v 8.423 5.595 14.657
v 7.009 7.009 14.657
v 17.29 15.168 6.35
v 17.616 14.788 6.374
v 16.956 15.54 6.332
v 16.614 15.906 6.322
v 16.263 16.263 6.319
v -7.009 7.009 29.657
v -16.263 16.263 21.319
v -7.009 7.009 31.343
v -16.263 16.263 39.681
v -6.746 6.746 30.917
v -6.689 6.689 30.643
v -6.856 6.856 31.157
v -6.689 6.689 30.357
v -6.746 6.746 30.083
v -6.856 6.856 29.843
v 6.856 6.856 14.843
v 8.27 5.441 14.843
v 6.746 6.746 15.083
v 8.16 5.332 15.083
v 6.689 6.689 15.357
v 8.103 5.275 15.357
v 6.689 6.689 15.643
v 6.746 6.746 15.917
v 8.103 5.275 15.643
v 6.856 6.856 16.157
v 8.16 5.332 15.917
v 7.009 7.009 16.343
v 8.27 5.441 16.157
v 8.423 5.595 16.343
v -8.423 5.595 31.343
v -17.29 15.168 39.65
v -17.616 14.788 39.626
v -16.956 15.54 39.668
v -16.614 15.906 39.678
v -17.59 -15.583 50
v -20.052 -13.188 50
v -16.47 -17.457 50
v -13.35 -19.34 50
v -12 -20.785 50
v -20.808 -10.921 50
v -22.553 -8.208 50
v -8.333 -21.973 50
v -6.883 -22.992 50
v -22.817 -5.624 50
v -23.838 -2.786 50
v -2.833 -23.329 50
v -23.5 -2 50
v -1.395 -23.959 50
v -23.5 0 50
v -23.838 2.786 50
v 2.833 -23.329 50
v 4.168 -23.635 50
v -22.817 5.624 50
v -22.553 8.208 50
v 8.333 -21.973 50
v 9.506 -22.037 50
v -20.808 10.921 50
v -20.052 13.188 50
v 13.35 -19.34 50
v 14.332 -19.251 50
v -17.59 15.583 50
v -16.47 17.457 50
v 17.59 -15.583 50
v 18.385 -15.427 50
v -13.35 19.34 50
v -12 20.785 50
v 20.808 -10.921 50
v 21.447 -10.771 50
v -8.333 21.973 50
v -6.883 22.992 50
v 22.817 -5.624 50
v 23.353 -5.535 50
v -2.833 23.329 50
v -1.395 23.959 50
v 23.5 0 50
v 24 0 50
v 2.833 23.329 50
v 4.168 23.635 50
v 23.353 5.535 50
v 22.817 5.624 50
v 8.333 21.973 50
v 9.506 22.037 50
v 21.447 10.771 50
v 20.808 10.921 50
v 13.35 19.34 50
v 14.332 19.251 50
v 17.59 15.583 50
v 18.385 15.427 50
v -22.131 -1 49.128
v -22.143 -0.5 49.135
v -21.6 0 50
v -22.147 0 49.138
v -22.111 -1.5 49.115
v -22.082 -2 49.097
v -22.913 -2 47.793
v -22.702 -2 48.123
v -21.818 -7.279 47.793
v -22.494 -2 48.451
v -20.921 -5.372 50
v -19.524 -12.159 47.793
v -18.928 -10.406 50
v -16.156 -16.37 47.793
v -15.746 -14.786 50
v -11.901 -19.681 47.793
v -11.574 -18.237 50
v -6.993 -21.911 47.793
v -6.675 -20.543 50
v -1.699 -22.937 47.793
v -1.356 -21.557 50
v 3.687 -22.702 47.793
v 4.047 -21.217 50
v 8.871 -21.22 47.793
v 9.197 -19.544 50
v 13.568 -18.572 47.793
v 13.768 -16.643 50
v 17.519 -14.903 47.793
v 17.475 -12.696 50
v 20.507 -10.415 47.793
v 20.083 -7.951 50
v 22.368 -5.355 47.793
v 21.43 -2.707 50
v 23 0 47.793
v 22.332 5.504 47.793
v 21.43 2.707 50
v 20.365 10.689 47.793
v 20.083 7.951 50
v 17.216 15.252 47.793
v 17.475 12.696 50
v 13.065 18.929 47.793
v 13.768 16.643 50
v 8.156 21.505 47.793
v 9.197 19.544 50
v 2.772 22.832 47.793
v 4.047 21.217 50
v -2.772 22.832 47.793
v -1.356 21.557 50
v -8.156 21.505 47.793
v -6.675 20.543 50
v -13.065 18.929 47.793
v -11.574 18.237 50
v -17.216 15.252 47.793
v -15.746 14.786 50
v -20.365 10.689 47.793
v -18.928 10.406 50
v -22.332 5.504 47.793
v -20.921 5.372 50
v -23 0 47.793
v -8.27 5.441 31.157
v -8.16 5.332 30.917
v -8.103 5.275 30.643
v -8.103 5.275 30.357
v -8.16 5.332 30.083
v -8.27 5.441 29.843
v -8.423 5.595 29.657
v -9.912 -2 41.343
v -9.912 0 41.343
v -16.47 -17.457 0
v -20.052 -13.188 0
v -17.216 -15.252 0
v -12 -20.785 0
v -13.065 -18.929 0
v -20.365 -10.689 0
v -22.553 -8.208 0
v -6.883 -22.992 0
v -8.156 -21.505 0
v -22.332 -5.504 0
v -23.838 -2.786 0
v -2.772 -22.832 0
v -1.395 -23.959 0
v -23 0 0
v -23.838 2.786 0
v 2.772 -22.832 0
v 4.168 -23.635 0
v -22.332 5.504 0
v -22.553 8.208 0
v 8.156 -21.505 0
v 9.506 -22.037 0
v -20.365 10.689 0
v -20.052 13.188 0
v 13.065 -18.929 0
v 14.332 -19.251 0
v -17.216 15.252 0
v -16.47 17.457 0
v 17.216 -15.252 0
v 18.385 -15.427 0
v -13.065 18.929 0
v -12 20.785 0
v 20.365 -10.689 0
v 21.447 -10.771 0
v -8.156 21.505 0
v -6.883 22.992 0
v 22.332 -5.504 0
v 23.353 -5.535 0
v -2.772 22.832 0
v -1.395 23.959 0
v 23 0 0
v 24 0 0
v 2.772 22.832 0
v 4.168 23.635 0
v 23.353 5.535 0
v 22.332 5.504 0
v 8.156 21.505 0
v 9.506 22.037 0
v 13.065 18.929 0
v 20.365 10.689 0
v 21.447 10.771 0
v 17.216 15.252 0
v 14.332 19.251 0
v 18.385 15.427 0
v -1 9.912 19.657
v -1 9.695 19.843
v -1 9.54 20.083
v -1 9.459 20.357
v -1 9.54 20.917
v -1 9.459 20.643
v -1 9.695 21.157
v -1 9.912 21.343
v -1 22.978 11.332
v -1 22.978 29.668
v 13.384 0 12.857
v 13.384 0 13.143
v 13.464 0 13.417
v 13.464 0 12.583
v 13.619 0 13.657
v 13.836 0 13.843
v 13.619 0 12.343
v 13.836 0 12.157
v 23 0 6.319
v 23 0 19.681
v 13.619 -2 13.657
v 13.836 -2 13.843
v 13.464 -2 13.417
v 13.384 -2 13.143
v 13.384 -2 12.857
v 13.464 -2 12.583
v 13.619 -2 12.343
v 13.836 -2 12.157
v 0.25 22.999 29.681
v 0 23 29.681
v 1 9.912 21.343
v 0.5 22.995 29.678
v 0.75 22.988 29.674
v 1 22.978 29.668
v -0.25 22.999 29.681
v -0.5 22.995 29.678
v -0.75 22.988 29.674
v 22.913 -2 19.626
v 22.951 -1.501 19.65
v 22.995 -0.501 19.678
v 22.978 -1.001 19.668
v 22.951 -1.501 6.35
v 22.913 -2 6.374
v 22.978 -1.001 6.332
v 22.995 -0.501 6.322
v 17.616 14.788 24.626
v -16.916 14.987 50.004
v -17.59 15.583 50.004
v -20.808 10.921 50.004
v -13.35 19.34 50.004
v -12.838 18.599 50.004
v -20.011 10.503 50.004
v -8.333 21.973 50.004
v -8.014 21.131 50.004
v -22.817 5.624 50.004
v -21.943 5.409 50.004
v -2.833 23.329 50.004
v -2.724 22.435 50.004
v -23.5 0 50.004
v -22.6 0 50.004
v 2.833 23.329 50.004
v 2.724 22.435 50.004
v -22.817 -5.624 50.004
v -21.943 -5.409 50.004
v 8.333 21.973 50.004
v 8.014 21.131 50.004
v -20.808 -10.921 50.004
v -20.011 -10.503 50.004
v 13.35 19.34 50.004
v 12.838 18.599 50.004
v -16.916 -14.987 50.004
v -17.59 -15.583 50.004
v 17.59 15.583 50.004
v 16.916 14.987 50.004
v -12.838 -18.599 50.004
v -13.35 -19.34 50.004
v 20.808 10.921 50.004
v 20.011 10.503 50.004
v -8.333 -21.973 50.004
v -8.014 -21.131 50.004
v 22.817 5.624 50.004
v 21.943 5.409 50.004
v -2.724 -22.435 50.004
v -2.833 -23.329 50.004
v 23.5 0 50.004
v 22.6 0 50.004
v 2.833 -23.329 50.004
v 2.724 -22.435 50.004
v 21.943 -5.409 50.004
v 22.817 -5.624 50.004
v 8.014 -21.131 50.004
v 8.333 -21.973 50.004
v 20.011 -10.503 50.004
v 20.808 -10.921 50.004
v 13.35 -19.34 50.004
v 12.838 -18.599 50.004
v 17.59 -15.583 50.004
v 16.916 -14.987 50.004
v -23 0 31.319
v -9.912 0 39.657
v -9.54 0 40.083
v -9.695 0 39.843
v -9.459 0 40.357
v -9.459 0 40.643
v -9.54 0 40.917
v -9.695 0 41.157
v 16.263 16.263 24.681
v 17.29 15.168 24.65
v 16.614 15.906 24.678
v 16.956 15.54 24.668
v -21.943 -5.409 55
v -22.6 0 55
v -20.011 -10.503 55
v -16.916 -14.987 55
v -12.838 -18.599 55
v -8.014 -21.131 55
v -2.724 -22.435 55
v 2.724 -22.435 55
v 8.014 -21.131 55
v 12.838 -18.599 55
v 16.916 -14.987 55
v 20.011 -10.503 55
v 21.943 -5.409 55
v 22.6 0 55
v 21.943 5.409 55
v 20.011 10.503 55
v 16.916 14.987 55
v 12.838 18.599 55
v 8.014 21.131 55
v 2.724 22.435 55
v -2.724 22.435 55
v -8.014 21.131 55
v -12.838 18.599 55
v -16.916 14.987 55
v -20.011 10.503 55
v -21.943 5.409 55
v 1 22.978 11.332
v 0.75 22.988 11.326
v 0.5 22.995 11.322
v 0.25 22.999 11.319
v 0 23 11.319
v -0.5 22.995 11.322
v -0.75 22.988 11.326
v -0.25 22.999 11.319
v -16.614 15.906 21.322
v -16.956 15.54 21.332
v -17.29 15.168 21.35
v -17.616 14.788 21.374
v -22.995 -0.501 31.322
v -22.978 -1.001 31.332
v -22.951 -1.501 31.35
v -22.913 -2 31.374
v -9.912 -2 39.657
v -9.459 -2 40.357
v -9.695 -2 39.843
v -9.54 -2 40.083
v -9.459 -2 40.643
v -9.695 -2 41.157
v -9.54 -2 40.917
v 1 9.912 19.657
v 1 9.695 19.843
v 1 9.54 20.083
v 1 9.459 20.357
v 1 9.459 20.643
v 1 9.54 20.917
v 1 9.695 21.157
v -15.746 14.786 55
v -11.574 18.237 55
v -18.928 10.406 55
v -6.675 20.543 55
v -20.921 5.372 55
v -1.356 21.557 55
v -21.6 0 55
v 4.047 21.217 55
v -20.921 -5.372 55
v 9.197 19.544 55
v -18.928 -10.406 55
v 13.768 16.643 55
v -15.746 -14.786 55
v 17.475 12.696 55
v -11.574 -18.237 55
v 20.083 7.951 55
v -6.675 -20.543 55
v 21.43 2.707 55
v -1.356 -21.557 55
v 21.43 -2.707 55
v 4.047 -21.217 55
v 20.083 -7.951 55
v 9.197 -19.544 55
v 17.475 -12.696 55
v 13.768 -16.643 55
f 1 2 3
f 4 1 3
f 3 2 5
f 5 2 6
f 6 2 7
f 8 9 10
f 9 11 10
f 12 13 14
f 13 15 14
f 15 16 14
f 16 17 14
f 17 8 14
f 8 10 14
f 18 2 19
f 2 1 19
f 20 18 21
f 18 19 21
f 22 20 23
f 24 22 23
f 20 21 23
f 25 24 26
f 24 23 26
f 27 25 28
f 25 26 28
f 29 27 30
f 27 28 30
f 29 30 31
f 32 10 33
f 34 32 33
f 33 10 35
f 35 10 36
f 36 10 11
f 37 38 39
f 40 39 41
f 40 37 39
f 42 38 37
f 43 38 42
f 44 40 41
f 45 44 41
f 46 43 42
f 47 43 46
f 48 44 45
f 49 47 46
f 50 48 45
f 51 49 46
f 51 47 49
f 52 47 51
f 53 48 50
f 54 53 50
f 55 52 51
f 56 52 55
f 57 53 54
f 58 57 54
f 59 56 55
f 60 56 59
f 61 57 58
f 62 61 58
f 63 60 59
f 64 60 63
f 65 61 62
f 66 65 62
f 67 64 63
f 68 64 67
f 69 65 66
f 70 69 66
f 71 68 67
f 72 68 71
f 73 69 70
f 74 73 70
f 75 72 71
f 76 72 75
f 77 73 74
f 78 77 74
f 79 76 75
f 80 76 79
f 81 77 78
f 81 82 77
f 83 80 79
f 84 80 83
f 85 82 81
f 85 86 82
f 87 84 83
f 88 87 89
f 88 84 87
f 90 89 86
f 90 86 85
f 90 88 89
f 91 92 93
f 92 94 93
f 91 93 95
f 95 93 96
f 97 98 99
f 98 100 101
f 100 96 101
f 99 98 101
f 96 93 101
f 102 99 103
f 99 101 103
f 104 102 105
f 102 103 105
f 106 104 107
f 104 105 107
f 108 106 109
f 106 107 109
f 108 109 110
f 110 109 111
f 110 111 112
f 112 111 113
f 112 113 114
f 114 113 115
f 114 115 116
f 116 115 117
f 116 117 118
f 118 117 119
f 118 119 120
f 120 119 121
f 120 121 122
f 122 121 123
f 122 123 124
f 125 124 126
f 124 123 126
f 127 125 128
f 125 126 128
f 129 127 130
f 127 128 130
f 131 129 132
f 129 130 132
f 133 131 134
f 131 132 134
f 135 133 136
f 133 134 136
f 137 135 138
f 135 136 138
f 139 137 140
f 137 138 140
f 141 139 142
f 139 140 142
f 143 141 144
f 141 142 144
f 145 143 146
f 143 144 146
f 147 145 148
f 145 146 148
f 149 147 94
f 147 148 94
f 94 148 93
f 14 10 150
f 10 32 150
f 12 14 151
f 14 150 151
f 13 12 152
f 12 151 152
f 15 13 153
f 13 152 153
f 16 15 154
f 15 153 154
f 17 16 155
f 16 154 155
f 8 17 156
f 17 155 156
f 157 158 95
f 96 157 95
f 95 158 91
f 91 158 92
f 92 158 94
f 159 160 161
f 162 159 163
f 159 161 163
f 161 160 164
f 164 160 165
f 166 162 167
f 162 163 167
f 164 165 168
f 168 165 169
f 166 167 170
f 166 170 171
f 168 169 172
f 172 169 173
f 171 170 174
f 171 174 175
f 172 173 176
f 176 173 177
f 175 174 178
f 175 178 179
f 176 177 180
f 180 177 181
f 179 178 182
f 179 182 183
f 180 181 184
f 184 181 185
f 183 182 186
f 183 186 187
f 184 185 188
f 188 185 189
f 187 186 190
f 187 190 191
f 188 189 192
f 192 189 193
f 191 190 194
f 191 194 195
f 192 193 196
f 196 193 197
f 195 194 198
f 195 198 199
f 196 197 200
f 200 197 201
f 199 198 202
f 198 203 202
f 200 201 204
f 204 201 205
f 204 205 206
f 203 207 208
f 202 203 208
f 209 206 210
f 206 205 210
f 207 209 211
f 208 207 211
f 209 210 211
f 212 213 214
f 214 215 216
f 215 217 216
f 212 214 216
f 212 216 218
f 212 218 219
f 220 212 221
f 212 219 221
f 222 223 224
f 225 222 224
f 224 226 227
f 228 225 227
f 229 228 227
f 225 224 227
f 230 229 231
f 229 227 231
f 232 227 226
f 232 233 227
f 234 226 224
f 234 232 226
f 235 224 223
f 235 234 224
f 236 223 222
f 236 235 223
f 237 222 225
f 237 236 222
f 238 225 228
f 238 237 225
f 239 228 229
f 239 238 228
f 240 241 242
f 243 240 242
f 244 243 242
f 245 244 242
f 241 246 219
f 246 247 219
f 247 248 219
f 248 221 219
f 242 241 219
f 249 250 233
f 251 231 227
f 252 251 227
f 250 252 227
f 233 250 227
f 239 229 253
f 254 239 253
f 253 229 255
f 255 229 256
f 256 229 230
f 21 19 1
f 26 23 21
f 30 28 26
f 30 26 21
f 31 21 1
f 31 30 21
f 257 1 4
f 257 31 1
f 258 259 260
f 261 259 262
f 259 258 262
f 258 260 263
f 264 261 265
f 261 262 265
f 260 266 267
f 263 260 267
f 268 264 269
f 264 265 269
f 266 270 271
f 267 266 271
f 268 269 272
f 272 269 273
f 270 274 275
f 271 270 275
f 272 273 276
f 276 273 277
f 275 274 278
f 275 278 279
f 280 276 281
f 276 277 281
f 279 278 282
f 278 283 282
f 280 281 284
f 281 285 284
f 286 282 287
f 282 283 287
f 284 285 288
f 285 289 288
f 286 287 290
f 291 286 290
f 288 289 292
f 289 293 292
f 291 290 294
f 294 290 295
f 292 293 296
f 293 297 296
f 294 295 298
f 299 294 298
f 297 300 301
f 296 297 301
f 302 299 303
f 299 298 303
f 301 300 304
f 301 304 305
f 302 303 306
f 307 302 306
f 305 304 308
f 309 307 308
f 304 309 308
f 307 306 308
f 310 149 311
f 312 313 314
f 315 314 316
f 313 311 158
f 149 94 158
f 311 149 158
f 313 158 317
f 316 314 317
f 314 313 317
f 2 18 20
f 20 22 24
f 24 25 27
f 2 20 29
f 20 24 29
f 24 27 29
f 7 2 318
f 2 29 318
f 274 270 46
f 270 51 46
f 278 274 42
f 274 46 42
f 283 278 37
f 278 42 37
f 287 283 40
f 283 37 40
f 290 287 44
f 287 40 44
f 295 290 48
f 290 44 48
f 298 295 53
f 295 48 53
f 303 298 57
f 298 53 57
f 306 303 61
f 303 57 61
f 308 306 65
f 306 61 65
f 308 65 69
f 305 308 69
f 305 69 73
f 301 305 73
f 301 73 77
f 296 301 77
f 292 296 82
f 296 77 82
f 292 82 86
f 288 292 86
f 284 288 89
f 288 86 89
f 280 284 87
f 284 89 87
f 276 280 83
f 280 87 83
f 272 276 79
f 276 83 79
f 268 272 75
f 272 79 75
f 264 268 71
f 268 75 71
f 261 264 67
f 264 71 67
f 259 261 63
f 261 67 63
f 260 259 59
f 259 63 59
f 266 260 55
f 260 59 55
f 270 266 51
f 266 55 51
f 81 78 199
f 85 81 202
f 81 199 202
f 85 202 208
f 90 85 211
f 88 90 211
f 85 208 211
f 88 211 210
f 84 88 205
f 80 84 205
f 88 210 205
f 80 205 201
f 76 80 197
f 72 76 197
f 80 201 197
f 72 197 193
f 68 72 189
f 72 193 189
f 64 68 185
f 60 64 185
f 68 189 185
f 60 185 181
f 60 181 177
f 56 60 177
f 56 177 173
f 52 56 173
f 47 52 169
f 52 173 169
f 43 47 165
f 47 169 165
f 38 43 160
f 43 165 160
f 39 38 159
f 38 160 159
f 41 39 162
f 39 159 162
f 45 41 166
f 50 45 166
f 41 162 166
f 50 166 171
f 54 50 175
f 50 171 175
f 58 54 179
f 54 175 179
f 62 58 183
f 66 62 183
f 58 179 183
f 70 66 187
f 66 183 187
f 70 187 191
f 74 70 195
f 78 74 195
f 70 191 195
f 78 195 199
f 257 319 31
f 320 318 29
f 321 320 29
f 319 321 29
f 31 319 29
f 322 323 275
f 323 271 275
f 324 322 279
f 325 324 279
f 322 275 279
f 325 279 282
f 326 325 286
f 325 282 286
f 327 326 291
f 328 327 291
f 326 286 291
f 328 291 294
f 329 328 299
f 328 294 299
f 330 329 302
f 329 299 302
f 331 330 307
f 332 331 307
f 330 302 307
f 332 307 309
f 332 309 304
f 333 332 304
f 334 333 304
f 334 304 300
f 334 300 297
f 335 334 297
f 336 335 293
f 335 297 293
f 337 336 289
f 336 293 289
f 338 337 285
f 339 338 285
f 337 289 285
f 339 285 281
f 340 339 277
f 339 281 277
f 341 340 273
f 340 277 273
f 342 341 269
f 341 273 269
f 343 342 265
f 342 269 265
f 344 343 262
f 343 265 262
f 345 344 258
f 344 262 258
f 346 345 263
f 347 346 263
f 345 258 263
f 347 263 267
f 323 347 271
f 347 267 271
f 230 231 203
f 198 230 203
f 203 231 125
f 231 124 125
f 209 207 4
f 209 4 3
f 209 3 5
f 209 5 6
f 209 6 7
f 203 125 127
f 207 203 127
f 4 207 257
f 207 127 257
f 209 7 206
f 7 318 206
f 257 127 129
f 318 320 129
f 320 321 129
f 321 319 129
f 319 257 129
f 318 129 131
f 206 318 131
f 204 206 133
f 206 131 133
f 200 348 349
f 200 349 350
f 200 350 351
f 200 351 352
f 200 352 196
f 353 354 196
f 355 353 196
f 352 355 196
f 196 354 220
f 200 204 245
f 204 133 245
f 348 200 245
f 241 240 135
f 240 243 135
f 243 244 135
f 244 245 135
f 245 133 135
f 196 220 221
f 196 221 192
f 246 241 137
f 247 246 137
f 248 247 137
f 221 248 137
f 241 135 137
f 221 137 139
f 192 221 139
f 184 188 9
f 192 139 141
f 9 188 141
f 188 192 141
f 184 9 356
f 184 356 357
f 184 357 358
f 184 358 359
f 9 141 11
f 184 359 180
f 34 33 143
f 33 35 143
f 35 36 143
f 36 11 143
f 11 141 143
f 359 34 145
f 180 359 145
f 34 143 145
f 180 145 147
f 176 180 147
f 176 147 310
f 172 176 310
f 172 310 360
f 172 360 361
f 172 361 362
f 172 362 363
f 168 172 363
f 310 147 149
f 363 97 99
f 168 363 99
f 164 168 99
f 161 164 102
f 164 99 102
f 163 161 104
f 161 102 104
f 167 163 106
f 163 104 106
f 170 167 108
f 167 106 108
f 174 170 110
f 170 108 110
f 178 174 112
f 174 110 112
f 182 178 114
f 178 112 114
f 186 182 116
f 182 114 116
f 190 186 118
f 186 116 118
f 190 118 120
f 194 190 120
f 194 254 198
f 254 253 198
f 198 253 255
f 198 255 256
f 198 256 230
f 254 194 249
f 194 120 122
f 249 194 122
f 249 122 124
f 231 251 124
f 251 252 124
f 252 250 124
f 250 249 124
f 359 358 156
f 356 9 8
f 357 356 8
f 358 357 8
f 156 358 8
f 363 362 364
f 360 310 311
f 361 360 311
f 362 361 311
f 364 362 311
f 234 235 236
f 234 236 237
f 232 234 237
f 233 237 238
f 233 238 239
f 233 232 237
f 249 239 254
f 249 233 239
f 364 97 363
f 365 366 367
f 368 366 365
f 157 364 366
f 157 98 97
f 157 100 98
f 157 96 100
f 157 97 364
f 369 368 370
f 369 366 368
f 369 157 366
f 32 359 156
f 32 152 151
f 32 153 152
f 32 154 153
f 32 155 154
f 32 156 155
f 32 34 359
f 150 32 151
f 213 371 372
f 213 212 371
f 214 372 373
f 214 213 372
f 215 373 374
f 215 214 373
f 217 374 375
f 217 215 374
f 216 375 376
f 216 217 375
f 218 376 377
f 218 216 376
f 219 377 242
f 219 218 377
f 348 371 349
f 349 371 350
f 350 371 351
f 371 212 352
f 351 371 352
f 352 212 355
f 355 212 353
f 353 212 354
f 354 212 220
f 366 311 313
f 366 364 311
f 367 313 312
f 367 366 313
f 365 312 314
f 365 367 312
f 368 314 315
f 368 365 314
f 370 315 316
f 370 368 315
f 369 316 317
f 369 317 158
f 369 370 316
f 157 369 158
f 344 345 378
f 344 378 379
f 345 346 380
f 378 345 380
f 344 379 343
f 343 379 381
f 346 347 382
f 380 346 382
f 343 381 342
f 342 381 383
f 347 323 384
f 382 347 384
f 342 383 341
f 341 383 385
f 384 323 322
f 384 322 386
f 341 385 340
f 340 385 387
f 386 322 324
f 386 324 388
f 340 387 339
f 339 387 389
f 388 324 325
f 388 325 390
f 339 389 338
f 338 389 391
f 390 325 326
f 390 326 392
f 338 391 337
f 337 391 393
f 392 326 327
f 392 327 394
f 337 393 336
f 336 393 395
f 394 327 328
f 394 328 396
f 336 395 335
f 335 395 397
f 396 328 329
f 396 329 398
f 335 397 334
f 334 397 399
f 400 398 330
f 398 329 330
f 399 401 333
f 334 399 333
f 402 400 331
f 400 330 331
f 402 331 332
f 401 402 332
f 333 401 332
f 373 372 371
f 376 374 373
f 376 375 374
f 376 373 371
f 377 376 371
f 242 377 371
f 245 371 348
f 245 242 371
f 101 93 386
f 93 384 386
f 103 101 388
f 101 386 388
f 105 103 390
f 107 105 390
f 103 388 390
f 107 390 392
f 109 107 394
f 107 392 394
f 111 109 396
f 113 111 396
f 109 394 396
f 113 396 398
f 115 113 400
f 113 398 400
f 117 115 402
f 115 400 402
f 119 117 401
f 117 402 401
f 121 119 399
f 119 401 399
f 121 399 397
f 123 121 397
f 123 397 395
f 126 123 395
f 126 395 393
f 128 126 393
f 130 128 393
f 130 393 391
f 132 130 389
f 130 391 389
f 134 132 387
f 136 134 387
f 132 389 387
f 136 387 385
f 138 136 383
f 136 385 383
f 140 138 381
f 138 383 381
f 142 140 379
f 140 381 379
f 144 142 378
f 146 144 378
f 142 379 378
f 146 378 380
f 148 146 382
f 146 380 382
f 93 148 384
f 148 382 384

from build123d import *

# Parameters (mm, degrees)
F0_R           = 24
F1_DEPTH       = 50
F2_R           = 23
F3_DEPTH       = 50.001
F10_DEPTH      = 2
F13_DEPTH      = 2
F16_DEPTH      = 1
F16_DEPTH_BACK = 1
F19_DEPTH      = 2
F20_R          = 1


with BuildPart() as f1:
    # F0 (on Top) → F1 (new body)
    with BuildSketch(Plane.XY):
        Circle(F0_R)
    extrude(amount=F1_DEPTH)

    # F2 (on face) → F3 (cut, through all)
    with BuildSketch(Plane.XY.offset(50)):
        Circle(F2_R)
    extrude(amount=-F3_DEPTH, mode=Mode.SUBTRACT)

    # F4 (on Front) → F5 (revolve)
    with BuildSketch(Plane.XZ):
        Polygon((-22.6, 50.0044703981), (-23.5, 50.0044703981), (-23.5, 47.0044703981), (-21.6, 50), (-21.6, 55), (-22.6, 55), align=None)
    revolve(axis=Axis((0, 0, 50), (0, 0, 1)))

    # F9 (on Front) → F10 (join)
    with BuildSketch(Plane.XZ):
        Polygon((-8.5879870174, 40.5), (-23.5, 50), (-23.5, 31), align=None)
        Polygon((23.5, 6), (23.5, 20), (12.5122009602, 13), align=None)
    extrude(amount=F10_DEPTH)

    # F12 (on 3pt) → F13 (join)
    with BuildSketch(Plane(origin=(0, 0, 0), x_dir=(0.7071067812, -0.7071067812, 0), z_dir=(-0.7071067812, -0.7071067812, 0))):
        Polygon((-8.5879870174, 30.5), (-23.5, 40), (-23.5, 21), align=None)
    extrude(amount=F13_DEPTH)

    # F15 (on 3pt) → F16 (join, two sides)
    with BuildSketch(Plane.YZ) as f16_sk:
        Polygon((23.5, 11), (23.5, 30), (8.5879870174, 20.5), align=None)
    extrude(amount=-F16_DEPTH)
    extrude(f16_sk.sketch, amount=F16_DEPTH_BACK)

    # F18 (on 3pt) → F19 (join)
    with BuildSketch(Plane(origin=(0, 0, 0), x_dir=(0.7071067812, 0.7071067812, 0), z_dir=(0.7071067812, -0.7071067812, 0))):
        Polygon((23.5, 6), (23.5, 25), (8.5879870174, 15.5), align=None)
    extrude(amount=F19_DEPTH)

    # F20
    f20_edges = [f1.edges().sort_by_distance(p)[0] for p in [
        (-8.587987, -1, 40.5),
        (-6.779731, 5.365517, 30.5),
        (0, 8.587987, 20.5),
        (6.779731, 5.365517, 15.5),
        (12.512201, -1, 13),
    ]]
    fillet(f20_edges, radius=F20_R)


solid = f1.part
